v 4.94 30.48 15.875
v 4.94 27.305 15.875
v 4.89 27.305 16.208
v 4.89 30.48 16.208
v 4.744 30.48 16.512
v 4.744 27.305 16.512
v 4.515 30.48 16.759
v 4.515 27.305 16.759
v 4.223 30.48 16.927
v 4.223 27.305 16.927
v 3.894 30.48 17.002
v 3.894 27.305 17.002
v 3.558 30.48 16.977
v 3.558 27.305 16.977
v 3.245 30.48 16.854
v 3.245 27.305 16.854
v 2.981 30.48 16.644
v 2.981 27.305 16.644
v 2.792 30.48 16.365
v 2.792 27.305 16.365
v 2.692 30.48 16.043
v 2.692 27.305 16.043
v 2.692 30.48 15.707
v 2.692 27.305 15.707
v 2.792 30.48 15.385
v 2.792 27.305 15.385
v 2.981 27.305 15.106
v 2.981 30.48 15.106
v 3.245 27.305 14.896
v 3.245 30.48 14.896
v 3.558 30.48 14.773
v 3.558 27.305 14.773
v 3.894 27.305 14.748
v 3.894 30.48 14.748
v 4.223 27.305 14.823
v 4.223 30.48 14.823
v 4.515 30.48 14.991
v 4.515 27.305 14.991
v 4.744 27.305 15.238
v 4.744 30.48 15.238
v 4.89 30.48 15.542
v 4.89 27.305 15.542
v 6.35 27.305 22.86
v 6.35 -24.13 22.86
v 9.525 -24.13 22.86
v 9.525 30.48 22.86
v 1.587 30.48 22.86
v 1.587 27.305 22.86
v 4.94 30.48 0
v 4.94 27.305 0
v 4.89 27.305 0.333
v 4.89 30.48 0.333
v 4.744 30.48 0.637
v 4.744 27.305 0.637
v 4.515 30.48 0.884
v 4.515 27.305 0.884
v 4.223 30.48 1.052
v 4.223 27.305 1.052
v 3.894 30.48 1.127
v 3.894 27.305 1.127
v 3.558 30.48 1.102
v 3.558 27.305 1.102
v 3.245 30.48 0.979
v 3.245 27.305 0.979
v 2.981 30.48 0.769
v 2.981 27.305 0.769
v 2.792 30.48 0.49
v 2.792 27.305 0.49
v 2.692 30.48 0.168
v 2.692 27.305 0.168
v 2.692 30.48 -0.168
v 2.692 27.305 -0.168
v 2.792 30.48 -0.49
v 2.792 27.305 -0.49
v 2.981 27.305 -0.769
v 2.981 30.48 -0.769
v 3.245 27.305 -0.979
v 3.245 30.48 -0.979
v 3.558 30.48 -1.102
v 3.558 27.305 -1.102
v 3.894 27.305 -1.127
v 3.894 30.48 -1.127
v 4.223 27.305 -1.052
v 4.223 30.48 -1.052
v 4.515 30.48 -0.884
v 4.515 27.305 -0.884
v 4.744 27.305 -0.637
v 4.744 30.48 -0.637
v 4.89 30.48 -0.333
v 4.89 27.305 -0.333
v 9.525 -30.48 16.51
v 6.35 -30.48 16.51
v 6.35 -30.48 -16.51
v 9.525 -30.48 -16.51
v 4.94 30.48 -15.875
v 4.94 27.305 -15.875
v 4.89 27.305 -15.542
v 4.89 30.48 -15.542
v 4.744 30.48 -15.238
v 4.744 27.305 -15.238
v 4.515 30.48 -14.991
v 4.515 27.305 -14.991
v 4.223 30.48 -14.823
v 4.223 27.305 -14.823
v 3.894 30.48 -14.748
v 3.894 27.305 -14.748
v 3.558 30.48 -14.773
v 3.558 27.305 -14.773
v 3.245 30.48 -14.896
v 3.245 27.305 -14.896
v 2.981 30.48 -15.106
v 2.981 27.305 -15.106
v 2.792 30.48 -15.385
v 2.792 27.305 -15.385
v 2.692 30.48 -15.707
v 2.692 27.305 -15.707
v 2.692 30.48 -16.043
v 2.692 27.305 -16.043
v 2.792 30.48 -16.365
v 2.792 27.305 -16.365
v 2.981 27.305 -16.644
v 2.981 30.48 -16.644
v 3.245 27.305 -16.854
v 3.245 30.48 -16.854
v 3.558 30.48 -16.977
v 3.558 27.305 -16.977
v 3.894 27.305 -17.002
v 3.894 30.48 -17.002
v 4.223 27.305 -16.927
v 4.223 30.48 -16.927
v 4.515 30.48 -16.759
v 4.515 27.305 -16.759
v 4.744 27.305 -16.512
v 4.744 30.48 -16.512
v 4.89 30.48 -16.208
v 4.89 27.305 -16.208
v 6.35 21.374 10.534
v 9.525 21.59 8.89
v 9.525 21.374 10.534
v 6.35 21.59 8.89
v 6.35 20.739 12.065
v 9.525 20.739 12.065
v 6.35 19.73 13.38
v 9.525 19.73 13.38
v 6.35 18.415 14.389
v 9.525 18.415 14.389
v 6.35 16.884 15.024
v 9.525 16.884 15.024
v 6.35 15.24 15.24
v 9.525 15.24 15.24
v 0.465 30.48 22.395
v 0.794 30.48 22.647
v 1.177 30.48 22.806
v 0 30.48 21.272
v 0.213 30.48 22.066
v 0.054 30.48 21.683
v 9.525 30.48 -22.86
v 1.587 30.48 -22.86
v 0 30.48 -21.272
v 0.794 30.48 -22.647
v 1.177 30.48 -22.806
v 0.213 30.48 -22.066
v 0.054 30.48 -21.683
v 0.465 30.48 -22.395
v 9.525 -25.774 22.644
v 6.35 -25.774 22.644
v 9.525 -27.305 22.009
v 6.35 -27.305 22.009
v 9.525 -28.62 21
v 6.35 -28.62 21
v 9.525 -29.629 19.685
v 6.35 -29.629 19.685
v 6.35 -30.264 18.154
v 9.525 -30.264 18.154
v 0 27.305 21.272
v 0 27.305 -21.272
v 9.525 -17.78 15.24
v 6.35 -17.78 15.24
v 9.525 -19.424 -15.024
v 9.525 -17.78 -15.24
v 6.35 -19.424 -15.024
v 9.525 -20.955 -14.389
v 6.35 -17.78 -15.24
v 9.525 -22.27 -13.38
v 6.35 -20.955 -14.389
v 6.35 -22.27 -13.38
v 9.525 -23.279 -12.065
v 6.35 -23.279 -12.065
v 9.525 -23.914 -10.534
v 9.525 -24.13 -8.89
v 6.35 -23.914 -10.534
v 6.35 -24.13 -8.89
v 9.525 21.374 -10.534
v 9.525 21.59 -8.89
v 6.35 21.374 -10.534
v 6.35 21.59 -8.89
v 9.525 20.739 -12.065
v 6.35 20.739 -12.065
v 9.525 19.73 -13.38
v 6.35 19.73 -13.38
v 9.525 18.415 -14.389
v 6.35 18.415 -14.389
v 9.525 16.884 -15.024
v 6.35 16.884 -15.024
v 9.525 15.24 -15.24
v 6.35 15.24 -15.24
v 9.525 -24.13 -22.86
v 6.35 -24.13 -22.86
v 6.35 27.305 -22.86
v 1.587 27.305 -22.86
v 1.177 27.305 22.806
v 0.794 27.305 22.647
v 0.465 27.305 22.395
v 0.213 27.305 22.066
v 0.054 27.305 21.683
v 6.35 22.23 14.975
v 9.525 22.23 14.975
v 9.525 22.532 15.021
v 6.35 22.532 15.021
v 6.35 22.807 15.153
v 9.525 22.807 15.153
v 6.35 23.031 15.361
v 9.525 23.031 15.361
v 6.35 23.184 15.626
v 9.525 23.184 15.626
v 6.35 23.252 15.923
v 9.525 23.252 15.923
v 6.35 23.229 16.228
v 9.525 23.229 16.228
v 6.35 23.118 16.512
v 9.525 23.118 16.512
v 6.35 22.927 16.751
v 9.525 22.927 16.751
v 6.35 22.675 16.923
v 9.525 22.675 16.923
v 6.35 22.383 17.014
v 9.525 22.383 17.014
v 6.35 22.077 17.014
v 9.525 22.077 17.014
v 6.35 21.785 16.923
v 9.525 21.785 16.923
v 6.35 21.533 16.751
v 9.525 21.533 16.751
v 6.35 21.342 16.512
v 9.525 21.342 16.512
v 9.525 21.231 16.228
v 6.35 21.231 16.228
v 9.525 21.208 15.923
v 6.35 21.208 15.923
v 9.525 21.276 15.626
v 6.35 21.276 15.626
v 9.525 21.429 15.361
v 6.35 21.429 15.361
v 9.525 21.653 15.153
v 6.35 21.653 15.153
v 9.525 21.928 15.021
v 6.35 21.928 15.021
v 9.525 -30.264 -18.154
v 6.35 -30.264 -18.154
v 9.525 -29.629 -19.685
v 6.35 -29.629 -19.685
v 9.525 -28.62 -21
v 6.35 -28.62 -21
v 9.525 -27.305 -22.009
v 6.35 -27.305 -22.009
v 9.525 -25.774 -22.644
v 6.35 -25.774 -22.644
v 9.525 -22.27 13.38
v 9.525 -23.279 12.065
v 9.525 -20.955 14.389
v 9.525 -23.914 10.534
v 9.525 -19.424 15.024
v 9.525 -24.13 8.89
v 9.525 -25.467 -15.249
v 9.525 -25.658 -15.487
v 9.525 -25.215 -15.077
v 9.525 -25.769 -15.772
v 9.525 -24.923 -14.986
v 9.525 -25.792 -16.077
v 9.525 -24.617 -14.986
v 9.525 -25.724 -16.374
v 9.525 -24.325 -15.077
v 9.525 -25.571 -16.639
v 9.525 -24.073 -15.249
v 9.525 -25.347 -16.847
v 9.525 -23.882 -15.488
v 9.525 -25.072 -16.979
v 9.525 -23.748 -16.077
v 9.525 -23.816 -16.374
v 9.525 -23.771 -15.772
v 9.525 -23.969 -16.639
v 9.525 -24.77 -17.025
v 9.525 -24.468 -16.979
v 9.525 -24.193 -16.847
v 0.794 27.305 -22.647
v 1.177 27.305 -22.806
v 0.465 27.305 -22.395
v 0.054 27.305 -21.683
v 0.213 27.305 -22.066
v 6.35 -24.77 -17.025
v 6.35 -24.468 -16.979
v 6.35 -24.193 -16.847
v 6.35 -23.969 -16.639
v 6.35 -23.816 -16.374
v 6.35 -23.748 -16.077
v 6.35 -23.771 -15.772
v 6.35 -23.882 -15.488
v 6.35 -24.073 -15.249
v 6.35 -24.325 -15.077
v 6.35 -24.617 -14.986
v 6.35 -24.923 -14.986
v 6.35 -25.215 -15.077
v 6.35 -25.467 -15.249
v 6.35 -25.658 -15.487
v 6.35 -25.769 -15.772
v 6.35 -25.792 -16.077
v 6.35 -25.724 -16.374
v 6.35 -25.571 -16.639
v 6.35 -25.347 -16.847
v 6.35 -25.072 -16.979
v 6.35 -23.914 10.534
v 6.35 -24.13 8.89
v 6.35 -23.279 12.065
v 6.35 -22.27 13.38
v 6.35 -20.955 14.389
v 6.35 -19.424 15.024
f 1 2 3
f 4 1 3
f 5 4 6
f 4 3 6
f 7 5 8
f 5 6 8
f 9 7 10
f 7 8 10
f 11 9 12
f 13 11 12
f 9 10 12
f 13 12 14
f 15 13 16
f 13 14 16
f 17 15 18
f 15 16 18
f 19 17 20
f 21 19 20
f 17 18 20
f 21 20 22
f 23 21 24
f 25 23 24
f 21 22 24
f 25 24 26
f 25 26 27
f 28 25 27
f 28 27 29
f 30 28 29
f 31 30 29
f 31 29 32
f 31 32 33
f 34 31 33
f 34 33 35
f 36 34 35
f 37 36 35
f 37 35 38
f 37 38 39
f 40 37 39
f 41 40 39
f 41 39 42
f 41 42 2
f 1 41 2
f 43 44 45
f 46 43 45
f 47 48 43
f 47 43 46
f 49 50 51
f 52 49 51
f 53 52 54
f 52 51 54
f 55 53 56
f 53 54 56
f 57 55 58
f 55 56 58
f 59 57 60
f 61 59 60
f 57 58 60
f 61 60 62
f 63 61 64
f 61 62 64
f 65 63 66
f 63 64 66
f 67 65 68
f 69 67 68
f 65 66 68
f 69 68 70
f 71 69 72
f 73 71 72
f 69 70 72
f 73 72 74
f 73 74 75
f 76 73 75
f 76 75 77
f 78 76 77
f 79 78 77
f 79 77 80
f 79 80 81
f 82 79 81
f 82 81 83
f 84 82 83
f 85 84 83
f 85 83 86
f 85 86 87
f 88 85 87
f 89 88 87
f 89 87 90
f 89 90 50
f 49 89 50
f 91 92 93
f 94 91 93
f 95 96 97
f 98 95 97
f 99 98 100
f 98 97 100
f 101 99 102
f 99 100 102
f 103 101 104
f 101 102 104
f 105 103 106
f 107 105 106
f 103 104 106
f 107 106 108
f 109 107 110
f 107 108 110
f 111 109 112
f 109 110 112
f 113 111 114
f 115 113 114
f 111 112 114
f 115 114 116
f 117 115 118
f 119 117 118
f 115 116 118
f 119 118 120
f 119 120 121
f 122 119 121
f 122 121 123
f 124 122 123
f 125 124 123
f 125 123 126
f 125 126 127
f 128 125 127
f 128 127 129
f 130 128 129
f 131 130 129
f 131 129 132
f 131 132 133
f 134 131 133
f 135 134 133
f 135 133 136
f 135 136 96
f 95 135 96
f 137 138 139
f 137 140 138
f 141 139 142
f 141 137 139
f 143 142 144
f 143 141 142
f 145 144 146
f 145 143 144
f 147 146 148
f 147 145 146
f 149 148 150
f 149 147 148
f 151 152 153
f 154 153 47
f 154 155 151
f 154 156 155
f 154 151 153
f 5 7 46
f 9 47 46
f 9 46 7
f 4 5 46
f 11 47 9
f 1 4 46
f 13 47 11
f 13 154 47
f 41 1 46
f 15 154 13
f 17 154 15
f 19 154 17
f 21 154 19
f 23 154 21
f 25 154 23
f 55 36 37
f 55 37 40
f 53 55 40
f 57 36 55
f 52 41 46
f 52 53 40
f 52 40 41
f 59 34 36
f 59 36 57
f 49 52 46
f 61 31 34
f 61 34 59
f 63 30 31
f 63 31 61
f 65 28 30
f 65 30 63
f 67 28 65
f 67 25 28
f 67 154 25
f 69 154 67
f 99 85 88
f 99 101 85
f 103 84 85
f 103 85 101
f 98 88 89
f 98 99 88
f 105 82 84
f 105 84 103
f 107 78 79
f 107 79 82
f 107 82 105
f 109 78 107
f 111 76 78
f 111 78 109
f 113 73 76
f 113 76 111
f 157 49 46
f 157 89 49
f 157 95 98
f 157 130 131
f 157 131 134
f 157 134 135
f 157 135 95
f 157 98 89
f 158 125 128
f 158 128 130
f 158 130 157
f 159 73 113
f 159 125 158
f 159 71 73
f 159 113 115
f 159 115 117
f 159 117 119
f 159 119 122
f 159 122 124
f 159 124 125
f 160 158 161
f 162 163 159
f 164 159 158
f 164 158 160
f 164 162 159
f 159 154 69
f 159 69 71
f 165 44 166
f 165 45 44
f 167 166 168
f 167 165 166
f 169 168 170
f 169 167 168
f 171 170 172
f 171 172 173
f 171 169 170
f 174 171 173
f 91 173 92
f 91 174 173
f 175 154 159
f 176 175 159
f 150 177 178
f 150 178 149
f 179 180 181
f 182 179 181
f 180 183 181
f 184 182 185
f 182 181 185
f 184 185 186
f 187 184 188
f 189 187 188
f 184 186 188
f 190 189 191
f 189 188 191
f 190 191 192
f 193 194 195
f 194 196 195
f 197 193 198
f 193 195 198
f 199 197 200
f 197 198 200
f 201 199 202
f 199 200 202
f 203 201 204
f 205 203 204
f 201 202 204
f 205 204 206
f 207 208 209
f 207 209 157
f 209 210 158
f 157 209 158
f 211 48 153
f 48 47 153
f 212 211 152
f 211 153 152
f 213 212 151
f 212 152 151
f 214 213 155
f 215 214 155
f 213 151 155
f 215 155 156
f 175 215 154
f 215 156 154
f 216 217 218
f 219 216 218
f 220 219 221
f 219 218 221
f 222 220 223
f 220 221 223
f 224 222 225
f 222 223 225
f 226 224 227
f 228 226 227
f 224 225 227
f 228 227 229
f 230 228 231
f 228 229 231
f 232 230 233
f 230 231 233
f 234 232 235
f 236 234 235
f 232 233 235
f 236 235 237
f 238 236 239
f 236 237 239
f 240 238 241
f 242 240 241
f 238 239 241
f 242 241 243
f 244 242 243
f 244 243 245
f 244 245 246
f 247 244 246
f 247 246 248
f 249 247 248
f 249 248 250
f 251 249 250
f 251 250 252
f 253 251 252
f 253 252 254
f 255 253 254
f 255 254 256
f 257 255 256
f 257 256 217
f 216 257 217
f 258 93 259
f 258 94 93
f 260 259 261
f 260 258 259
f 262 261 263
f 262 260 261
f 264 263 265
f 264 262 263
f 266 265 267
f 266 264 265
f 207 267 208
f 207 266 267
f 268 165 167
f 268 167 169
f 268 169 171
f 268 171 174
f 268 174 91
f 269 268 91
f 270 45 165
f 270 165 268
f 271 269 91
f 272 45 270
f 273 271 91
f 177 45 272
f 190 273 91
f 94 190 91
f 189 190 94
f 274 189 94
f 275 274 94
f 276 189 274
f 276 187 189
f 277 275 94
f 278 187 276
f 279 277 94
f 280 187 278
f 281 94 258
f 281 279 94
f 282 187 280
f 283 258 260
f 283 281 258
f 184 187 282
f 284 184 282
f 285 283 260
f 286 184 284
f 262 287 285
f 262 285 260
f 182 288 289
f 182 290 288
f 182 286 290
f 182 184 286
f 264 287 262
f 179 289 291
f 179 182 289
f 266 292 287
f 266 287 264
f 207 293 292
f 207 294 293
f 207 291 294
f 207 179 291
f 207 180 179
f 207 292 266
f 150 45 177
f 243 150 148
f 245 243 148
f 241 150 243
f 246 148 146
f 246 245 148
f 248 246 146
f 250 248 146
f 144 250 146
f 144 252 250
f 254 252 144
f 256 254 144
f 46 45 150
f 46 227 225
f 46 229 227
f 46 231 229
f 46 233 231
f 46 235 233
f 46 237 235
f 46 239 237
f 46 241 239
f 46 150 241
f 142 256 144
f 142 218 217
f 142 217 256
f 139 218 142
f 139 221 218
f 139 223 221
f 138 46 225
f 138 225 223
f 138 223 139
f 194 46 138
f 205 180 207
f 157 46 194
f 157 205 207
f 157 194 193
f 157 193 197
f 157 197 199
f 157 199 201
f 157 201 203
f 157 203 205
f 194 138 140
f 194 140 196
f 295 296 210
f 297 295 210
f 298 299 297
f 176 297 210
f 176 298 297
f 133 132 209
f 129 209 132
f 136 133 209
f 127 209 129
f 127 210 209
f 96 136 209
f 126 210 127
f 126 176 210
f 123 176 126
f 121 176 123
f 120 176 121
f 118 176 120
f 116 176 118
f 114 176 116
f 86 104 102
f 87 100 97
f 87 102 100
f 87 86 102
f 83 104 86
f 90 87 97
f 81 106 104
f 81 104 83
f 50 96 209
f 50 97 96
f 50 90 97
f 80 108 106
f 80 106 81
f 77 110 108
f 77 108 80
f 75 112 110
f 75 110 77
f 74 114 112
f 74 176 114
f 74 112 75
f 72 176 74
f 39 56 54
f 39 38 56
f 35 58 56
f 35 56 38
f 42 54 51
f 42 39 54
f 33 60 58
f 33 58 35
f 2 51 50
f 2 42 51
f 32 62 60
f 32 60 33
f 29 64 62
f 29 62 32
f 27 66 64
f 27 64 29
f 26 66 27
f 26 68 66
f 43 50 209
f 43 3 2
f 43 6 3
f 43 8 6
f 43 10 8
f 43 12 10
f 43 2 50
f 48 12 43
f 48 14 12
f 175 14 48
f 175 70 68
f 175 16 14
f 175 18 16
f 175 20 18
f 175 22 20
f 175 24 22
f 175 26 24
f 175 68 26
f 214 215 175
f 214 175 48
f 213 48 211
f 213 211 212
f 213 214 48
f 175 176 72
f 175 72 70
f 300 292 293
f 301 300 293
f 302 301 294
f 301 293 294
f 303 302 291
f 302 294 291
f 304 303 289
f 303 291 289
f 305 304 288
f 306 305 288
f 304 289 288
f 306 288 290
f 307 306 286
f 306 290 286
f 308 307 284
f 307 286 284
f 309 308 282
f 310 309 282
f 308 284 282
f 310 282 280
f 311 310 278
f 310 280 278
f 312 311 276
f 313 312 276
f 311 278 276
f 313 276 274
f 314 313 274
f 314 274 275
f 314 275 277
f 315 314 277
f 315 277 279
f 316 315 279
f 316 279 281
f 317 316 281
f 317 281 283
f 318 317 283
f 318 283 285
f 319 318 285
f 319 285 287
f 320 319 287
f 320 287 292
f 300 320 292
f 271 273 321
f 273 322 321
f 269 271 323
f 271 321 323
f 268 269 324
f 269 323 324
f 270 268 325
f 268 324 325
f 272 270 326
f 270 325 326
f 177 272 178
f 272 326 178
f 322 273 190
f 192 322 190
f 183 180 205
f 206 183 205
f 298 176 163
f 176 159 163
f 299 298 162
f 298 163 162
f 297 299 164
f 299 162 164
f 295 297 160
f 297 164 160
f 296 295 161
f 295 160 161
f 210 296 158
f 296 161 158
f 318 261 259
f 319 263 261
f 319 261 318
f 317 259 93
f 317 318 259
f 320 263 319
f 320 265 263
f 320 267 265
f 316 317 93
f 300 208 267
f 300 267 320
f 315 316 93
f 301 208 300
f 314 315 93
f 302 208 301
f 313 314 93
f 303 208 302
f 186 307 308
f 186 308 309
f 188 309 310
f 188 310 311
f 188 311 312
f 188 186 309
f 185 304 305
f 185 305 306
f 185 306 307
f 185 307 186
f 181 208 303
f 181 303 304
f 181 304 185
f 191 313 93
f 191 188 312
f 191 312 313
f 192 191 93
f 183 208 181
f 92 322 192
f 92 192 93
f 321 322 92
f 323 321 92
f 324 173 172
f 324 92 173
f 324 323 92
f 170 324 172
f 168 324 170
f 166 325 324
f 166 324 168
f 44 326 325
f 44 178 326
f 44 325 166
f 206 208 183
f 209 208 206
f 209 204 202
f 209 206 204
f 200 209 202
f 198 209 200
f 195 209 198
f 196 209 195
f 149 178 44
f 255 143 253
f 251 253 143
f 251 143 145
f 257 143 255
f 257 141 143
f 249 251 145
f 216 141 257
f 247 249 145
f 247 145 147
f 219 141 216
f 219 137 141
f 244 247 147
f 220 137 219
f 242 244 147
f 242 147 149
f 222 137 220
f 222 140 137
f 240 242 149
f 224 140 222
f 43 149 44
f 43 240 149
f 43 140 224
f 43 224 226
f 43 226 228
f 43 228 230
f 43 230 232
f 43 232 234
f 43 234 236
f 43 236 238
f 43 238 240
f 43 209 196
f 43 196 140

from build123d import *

# Parameters (mm, degrees)
SKETCH1_W                    = 45.72
SKETCH1_H                    = 60.96
BOSS_EXTRUDE1_DEPTH          = 9.525
SKETCH2_W                    = 45.72
SKETCH2_H                    = 57.785
CUT_EXTRUDE1_DEPTH           = 6.35
SKETCH3_W                    = 30.48
SKETCH3_H                    = 45.72
CUT_EXTRUDE2_DEPTH           = 40.272581084
FILLET1_R                    = 6.35
M2_5X0_45_TAPPED_HOLE1_D     = 2.05
M2_5X0_45_TAPPED_HOLE1_DEPTH = 7.366
M2_5X0_45_TAPPED_HOLE1_TIP   = 0.615882135
F_4_40_TAPPED_HOLE1_D        = 2.2606
FILLET2_R                    = 1.5875


with BuildPart() as part:
    # Sketch1 → Boss-Extrude1 (new body)
    with BuildSketch(Plane(origin=(0, 0, 0), x_dir=(0, 0, -1), z_dir=(1, 0, 0))):
        Rectangle(SKETCH1_W, SKETCH1_H)
    extrude(amount=BOSS_EXTRUDE1_DEPTH)

    # Sketch2 → Cut-Extrude1 (cut)
    with BuildSketch(Plane.ZY):
        with Locations((0, -1.5875)):
            Rectangle(SKETCH2_W, SKETCH2_H)
    extrude(amount=-CUT_EXTRUDE1_DEPTH, mode=Mode.SUBTRACT)

    # Sketch3 → Cut-Extrude2 (cut, through all)
    with BuildSketch(Plane(origin=(9.525, 0, 0), x_dir=(0, 0, -1), z_dir=(1, 0, 0))):
        with Locations((0, -1.27)):
            Rectangle(SKETCH3_W, SKETCH3_H)
    extrude(amount=-CUT_EXTRUDE2_DEPTH, mode=Mode.SUBTRACT)

    # Fillet1
    fillet1_edges = [part.edges().sort_by_distance(p)[0] for p in [
        (7.9375, 21.59, -15.24),
        (7.9375, -24.13, -15.24),
        (7.9375, -24.13, 15.24),
        (7.9375, 21.59, 15.24),
        (7.9375, -30.48, -22.86),
        (7.9375, -30.48, 22.86),
    ]]
    fillet(fillet1_edges, radius=FILLET1_R)

    # M2.5x0.45 Tapped Hole1
    with Locations(Plane.ZY.offset(-6.35)):
        with Locations((16, 22.23), (-16, -24.77), (0, -1.27)):
            Hole(M2_5X0_45_TAPPED_HOLE1_D / 2, depth=M2_5X0_45_TAPPED_HOLE1_DEPTH)
            with Locations((0, 0, -(M2_5X0_45_TAPPED_HOLE1_DEPTH + M2_5X0_45_TAPPED_HOLE1_TIP / 2))):  # 118° drill point
                Cone(0, M2_5X0_45_TAPPED_HOLE1_D / 2, M2_5X0_45_TAPPED_HOLE1_TIP, mode=Mode.SUBTRACT)

    # #4-40 Tapped Hole1 (through all)
    with Locations(Plane(origin=(0, 30.48, 0), x_dir=(-1, 0, 0), z_dir=(0, 1, 0))):
        with Locations((-3.81, -15.875), (-3.81, 15.875), (-3.81, 0)):
            Hole(F_4_40_TAPPED_HOLE1_D / 2)

    # Fillet2
    fillet2_edges = [part.edges().sort_by_distance(p)[0] for p in [
        (0, 28.8925, -22.86),
        (0, 28.8925, 22.86),
    ]]
    fillet(fillet2_edges, radius=FILLET2_R)


solid = part.part
